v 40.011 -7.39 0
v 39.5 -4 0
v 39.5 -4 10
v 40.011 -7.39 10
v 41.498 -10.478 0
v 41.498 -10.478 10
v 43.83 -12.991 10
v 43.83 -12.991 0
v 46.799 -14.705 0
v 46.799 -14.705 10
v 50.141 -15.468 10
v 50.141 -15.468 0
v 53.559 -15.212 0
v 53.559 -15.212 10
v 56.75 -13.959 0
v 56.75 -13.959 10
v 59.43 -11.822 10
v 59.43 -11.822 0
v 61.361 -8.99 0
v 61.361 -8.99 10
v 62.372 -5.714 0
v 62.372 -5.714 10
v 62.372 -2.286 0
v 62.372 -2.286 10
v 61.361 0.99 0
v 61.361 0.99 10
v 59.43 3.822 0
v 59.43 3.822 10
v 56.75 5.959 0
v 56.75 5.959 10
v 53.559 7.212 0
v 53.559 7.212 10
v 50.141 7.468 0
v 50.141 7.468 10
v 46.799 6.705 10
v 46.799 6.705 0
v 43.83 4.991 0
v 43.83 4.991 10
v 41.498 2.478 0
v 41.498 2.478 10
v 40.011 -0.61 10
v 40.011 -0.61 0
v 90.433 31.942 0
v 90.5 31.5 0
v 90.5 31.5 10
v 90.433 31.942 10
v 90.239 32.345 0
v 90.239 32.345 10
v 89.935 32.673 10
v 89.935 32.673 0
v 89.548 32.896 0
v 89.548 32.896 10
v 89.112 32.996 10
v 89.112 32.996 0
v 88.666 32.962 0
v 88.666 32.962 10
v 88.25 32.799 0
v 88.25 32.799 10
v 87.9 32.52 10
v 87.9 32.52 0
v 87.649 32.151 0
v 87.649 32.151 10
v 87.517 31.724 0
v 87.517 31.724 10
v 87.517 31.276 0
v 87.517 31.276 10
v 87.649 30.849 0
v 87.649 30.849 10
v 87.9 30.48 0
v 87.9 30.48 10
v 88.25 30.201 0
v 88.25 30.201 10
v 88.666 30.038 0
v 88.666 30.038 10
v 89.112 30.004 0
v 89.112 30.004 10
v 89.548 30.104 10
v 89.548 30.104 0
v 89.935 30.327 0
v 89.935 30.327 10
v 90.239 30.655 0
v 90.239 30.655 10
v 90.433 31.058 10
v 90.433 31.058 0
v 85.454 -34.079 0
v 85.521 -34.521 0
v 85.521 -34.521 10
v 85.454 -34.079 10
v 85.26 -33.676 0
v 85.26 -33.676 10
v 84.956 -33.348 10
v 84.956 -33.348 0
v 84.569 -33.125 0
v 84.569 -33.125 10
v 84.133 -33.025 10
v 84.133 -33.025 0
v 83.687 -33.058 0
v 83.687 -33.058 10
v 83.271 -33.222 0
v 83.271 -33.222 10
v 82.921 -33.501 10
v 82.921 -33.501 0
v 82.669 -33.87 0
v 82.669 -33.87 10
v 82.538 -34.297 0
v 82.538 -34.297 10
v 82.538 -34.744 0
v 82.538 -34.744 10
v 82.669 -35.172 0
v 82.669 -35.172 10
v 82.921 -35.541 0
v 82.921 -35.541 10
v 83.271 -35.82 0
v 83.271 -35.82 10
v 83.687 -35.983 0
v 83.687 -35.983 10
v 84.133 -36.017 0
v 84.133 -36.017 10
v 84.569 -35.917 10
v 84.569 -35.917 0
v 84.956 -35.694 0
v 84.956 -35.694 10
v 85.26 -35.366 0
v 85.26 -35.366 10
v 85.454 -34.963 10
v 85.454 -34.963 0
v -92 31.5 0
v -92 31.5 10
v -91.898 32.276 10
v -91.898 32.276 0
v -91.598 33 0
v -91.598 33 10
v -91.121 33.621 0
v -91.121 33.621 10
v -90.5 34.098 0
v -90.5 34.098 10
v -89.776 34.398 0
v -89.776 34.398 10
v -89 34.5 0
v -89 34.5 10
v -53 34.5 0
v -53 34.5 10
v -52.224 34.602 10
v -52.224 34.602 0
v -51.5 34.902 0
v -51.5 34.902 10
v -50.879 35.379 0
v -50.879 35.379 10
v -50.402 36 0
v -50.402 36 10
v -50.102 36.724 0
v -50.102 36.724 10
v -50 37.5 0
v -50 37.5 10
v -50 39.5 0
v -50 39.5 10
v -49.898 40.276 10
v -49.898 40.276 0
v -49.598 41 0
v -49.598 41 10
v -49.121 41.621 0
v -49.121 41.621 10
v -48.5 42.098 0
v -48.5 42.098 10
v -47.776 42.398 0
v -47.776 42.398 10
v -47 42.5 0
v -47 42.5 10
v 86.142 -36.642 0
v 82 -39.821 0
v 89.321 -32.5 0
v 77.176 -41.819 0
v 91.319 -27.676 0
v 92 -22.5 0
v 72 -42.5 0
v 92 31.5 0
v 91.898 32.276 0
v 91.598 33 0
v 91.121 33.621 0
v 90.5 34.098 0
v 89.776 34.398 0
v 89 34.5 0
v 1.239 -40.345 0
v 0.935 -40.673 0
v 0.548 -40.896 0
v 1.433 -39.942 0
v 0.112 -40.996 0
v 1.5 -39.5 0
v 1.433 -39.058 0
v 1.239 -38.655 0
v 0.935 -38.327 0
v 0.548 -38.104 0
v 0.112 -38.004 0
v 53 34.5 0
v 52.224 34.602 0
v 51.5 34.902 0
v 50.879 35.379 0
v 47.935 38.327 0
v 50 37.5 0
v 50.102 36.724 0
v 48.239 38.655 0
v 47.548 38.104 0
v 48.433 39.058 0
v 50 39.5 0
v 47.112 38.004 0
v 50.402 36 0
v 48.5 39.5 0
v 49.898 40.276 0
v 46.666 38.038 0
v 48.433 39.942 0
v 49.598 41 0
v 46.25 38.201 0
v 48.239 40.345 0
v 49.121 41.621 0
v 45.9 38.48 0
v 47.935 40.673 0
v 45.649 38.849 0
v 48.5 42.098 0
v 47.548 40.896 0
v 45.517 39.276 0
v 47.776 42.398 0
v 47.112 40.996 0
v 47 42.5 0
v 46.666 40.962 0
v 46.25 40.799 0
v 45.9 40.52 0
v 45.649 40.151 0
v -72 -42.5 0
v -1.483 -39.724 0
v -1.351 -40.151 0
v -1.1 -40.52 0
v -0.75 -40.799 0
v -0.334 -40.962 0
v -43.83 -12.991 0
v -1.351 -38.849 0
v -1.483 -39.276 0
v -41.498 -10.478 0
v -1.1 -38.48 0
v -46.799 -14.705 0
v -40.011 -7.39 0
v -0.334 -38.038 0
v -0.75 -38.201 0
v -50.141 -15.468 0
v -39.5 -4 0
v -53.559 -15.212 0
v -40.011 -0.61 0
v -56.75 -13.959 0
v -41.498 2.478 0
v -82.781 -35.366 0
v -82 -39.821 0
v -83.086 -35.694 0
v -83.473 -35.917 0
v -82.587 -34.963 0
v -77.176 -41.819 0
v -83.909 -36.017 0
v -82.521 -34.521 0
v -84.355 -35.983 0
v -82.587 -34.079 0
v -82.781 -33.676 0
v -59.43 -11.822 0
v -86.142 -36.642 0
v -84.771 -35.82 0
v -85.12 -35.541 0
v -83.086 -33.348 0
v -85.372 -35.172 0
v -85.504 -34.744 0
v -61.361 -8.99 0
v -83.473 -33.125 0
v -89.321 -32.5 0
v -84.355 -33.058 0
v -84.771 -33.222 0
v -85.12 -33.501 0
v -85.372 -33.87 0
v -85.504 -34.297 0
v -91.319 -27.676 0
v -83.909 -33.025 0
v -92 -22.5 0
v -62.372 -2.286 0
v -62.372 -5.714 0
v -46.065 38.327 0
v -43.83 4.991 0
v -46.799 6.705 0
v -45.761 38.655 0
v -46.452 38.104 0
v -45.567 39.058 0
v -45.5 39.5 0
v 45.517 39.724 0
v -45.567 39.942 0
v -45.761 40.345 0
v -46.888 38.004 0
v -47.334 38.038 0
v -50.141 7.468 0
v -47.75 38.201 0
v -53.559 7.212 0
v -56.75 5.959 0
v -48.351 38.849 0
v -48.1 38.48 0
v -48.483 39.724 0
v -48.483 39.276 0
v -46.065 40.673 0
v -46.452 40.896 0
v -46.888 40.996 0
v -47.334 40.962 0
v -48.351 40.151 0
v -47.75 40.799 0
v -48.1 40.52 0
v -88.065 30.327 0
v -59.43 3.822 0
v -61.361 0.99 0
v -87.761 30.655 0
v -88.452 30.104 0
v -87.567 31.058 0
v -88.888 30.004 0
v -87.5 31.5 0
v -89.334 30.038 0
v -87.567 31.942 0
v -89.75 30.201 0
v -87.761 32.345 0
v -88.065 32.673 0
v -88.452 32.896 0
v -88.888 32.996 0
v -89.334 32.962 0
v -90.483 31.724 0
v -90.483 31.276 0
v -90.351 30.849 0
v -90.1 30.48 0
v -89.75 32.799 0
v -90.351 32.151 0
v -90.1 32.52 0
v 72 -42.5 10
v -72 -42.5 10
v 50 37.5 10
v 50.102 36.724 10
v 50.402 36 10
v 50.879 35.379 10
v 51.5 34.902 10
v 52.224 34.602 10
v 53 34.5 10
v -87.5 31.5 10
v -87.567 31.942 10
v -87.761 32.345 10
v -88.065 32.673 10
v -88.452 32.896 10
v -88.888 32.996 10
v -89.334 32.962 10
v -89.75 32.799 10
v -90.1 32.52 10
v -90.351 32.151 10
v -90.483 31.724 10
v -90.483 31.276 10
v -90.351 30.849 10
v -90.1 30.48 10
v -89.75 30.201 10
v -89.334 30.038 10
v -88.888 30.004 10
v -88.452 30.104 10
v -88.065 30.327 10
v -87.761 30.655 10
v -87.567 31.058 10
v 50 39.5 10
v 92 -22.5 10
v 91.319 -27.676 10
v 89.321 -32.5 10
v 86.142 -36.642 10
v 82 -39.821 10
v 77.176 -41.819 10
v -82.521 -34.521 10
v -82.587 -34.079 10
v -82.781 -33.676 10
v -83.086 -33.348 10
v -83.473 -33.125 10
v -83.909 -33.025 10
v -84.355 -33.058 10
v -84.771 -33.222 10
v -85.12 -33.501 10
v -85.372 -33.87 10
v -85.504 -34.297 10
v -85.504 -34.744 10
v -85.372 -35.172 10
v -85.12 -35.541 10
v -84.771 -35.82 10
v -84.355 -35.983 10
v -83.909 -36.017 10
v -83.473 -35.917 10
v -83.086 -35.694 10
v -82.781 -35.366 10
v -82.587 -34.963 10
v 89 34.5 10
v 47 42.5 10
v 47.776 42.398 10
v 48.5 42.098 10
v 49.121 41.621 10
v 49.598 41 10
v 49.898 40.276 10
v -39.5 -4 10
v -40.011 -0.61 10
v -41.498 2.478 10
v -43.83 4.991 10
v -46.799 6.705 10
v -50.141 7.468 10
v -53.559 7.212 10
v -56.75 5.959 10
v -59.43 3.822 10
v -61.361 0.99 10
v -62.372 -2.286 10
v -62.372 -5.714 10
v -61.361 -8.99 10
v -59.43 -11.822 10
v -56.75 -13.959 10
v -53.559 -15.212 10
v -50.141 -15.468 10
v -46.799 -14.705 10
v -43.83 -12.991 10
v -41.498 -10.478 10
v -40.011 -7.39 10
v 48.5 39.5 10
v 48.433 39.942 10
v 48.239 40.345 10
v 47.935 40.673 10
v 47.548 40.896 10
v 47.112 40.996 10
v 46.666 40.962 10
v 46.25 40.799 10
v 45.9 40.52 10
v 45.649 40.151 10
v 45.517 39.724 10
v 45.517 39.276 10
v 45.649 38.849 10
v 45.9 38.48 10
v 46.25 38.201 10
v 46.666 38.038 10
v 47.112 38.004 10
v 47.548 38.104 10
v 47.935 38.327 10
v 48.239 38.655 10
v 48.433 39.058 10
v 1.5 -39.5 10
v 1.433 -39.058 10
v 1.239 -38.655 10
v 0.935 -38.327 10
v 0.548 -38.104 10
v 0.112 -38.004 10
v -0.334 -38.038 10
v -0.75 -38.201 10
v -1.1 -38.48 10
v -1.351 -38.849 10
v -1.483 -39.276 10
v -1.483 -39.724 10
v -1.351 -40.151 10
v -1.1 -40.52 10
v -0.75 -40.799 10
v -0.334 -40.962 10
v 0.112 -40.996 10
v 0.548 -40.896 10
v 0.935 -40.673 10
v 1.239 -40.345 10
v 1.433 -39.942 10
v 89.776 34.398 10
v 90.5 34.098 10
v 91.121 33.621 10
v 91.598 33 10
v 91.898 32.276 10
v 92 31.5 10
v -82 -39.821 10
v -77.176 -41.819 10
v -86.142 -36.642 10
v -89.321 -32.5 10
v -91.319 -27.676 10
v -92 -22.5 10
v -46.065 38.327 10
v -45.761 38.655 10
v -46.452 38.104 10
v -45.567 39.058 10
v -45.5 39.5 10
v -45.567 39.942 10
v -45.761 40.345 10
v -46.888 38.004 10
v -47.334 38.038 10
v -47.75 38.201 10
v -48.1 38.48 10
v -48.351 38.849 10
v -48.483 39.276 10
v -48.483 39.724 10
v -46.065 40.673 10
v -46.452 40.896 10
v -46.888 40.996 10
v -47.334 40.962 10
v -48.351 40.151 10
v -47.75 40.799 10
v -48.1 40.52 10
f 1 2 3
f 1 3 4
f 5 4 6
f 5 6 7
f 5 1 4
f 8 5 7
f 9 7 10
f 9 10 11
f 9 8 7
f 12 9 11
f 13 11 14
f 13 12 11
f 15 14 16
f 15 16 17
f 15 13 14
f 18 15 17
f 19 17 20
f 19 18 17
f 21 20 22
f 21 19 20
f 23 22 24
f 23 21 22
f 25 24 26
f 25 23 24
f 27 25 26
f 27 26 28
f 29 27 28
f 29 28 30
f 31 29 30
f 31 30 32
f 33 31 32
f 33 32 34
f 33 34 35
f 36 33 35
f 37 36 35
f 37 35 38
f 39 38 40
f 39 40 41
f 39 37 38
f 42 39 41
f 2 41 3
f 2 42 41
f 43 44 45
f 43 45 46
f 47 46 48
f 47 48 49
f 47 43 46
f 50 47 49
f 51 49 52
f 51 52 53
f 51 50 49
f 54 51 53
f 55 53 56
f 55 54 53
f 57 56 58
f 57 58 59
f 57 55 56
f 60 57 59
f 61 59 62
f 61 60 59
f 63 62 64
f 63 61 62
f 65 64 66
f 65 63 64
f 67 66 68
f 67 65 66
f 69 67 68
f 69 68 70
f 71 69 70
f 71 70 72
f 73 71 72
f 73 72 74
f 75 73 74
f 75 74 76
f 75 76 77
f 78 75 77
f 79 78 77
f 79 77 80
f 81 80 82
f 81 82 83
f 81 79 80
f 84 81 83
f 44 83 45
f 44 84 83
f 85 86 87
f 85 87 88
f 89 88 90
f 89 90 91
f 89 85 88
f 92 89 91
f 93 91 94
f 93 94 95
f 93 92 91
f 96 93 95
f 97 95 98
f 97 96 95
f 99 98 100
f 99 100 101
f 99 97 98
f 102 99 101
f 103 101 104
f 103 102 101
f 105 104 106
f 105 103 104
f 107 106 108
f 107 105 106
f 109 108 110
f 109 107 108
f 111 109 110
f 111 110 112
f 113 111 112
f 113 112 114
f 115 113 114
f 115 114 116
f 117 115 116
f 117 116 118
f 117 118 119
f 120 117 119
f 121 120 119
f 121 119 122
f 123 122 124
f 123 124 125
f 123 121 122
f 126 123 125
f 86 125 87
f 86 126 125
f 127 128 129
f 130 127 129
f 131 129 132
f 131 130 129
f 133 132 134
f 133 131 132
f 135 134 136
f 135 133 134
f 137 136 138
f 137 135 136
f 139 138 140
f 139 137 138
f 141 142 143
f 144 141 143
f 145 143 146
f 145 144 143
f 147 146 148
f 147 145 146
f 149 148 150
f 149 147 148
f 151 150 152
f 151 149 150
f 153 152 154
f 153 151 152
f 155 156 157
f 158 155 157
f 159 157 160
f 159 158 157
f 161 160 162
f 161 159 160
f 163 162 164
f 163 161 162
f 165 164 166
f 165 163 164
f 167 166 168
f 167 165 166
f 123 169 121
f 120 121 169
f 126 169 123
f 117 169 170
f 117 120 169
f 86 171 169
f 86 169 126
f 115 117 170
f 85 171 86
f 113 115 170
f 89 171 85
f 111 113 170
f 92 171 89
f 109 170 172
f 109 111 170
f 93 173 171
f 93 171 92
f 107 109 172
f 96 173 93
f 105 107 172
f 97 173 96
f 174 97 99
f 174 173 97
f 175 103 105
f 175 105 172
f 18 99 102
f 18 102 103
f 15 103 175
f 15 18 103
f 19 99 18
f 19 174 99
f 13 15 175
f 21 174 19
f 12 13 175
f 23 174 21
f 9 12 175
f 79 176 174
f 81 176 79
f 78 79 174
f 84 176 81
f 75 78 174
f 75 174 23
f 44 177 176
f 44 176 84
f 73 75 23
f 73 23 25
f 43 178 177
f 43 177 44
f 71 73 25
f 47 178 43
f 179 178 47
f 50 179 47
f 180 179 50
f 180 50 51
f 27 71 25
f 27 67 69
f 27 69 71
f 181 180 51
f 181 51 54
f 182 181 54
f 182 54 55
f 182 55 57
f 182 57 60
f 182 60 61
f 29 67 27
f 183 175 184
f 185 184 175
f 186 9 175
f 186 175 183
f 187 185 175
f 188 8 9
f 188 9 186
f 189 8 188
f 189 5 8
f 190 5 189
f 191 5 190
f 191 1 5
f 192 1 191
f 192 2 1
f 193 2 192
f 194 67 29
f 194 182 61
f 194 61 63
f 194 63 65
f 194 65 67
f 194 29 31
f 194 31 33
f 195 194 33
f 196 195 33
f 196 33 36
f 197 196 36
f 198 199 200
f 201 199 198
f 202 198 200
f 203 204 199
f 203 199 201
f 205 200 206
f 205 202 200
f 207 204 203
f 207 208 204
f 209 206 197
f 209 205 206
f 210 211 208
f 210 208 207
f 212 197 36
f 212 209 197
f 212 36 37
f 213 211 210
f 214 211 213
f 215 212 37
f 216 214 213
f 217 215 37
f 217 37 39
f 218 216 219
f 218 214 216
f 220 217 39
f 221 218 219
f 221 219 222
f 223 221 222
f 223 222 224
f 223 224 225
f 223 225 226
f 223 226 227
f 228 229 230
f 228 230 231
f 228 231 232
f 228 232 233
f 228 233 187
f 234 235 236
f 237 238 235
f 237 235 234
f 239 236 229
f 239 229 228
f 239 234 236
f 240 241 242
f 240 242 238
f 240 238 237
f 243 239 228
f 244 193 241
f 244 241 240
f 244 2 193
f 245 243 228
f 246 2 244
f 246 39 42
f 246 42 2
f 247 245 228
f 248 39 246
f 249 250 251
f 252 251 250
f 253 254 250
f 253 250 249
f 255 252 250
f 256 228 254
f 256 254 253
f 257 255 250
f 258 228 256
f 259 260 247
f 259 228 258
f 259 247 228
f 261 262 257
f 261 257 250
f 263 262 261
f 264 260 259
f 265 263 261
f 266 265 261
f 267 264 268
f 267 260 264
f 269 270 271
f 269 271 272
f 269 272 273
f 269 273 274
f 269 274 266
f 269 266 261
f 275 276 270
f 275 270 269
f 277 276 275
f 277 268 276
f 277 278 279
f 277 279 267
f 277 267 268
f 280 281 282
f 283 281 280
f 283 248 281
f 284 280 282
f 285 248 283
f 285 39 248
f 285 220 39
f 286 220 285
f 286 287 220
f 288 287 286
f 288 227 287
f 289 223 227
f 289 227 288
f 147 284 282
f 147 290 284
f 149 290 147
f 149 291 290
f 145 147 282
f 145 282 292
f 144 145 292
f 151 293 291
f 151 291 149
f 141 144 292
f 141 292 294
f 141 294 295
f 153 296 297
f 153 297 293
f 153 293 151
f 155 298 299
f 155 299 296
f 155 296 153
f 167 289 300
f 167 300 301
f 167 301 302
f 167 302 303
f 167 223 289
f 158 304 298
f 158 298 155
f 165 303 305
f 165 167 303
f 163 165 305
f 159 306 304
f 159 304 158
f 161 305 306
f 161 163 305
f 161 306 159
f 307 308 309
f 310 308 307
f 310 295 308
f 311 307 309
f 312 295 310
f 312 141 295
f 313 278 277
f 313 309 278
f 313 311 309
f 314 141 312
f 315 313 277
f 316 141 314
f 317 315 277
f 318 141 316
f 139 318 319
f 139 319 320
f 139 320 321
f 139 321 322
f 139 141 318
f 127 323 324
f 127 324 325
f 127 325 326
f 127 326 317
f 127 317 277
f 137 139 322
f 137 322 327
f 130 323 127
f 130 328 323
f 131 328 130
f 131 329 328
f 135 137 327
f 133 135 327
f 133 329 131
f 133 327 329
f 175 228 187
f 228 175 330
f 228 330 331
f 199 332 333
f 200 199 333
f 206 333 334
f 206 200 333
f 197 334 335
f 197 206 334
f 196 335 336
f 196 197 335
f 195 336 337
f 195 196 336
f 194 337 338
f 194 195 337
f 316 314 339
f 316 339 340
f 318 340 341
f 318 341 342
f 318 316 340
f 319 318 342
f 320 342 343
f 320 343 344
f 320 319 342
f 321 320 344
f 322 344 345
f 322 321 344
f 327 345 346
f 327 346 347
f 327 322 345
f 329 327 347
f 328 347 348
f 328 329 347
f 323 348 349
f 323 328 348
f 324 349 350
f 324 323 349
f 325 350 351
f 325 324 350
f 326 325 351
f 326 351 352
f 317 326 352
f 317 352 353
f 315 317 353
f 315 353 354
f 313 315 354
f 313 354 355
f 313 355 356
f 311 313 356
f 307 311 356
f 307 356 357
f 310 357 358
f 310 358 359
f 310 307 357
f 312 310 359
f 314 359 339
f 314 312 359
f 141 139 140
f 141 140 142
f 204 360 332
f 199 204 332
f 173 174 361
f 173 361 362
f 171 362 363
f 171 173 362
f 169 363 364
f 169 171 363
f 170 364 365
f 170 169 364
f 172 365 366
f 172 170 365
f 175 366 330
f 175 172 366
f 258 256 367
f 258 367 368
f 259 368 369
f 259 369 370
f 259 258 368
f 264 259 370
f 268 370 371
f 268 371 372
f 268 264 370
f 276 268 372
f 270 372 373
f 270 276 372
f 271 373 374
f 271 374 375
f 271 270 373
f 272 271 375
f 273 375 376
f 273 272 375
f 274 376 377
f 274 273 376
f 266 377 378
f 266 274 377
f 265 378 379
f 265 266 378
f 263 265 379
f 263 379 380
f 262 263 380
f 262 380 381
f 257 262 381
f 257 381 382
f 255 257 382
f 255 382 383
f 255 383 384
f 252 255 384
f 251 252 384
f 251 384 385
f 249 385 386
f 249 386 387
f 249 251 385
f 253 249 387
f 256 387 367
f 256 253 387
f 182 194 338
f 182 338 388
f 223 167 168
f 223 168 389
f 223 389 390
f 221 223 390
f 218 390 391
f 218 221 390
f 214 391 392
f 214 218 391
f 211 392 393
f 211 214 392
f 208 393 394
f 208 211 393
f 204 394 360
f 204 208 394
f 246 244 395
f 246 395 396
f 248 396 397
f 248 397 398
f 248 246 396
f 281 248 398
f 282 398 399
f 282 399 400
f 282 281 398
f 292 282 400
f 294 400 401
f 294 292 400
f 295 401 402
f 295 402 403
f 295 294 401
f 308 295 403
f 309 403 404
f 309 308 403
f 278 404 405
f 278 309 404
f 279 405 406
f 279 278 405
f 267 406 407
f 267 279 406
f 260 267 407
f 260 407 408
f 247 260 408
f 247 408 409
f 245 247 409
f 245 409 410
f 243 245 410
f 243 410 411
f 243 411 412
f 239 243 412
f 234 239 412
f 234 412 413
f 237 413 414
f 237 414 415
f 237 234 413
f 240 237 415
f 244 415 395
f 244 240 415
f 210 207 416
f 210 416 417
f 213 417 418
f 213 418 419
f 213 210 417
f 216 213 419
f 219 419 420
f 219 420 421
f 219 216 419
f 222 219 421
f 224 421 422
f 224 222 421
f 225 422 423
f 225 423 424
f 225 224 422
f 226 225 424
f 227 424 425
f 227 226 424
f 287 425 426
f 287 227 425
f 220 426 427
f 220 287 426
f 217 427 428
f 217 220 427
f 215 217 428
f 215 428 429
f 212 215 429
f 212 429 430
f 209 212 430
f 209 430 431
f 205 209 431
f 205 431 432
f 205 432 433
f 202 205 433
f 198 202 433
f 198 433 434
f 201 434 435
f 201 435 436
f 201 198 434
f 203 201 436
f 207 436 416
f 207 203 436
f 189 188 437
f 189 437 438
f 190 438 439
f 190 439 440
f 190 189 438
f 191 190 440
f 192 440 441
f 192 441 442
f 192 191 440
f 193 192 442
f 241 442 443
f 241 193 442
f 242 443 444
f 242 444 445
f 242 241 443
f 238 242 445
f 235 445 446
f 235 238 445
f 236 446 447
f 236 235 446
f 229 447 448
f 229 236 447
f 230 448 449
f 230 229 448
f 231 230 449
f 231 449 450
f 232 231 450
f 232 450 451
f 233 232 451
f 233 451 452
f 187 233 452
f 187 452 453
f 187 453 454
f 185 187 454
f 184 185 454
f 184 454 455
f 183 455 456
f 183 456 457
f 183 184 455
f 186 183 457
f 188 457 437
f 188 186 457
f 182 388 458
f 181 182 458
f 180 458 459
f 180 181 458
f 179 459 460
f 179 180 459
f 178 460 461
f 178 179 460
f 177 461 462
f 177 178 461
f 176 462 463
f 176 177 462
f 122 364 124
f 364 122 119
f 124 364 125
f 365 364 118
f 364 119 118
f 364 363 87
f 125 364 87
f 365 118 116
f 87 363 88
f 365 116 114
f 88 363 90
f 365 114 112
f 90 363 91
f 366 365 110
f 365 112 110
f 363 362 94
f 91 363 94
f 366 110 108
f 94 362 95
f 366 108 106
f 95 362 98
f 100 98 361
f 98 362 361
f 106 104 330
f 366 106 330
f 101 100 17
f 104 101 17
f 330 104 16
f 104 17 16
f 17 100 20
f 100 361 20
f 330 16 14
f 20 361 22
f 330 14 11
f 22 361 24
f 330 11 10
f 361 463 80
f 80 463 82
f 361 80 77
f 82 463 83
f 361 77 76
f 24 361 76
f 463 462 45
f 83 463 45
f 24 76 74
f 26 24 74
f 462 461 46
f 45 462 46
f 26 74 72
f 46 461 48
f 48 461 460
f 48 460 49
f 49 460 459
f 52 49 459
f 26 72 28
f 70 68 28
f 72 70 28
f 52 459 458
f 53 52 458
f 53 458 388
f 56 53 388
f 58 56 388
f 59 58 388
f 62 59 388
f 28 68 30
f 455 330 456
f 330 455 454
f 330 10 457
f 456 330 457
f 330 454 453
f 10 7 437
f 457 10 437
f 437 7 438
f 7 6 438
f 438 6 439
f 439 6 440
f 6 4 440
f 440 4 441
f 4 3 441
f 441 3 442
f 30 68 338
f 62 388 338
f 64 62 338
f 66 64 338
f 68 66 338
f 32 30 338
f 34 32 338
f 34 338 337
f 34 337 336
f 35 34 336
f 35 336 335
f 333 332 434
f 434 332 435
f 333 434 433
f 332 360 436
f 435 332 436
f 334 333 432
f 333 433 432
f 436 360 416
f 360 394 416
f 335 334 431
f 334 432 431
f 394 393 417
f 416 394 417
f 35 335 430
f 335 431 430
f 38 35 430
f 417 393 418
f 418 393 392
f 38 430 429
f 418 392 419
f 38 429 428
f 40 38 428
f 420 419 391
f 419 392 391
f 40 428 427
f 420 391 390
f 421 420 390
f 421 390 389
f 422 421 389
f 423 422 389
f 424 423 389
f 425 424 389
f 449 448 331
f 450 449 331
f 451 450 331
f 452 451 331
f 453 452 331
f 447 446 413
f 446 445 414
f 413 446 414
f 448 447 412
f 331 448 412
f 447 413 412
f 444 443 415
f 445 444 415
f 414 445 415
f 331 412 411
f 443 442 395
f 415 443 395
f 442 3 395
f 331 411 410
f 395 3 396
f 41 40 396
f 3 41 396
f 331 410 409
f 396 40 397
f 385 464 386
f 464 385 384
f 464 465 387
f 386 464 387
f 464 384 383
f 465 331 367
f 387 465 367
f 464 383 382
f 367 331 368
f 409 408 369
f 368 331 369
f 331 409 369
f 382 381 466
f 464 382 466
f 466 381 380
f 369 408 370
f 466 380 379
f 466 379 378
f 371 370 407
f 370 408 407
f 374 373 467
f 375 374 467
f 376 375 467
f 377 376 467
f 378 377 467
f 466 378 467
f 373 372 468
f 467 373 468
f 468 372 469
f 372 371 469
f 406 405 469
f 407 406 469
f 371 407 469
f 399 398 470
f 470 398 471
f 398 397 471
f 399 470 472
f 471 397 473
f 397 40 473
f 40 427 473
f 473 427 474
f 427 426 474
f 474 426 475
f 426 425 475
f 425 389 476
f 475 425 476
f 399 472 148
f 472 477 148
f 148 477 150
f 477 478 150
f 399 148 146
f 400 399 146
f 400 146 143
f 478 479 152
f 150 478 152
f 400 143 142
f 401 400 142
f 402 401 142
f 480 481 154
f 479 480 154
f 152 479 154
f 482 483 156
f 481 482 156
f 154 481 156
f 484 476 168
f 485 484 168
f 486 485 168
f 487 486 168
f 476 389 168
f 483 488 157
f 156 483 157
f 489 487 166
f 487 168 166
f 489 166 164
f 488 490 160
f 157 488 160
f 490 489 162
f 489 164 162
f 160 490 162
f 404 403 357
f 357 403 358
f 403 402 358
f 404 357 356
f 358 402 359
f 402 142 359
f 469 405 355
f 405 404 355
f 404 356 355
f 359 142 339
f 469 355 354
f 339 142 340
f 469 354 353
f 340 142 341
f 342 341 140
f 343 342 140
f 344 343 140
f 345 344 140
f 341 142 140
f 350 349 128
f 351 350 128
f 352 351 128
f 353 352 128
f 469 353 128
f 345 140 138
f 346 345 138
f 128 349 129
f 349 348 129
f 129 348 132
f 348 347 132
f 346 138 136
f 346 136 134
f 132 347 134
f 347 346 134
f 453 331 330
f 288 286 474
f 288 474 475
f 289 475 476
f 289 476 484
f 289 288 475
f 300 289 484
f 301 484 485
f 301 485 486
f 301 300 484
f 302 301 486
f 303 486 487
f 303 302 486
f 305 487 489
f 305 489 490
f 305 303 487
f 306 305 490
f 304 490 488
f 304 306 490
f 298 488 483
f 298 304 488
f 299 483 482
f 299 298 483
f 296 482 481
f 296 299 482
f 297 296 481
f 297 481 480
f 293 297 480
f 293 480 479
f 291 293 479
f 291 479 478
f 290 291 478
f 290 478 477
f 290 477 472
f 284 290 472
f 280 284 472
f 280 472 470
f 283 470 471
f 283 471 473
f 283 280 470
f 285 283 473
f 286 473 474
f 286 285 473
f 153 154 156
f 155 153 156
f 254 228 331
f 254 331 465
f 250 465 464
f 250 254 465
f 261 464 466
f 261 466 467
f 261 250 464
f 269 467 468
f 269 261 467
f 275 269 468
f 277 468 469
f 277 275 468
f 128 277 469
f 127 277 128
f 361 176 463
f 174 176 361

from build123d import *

# Parameters (mm, degrees)
SKETCH1_R           = 11.5
SKETCH1_R_2         = 1.5
BOSS_EXTRUDE1_DEPTH = 10


with BuildPart() as part:
    # Sketch1 → Boss-Extrude1 (new body)
    with BuildSketch(Plane.XY):
        with BuildLine():
            Line((50, 39.5), (50, 37.5))
            ThreePointArc((50, 37.5), (50.878679656, 35.378679656), (53, 34.5))
            Line((53, 34.5), (89, 34.5))
            ThreePointArc((89, 34.5), (91.121320344, 33.621320344), (92, 31.5))
            Line((92, 31.5), (92, -22.5))
            ThreePointArc((92, -22.5), (86.142135624, -36.642135624), (72, -42.5))
            Line((72, -42.5), (-72, -42.5))
            ThreePointArc((-72, -42.5), (-86.142135624, -36.642135624), (-92, -22.5))
            Line((-92, -22.5), (-92, 31.5))
            ThreePointArc((-92, 31.5), (-91.121320344, 33.621320344), (-89, 34.5))
            Line((-89, 34.5), (-53, 34.5))
            ThreePointArc((-53, 34.5), (-50.878679656, 35.378679656), (-50, 37.5))
            Line((-50, 37.5), (-50, 39.5))
            ThreePointArc((-50, 39.5), (-49.121320344, 41.621320344), (-47, 42.5))
            Line((-47, 42.5), (47, 42.5))
            ThreePointArc((47, 42.5), (49.121320344, 41.621320344), (50, 39.5))
        make_face()
        with Locations(Location((51, -4, 0), (0, 0, 180))):
            Circle(SKETCH1_R, mode=Mode.SUBTRACT)
        with Locations((0, -39.5)):
            Circle(SKETCH1_R_2, mode=Mode.SUBTRACT)
        with Locations((84.02081528, -34.52081528)):
            Circle(SKETCH1_R_2, mode=Mode.SUBTRACT)
        with Locations((89, 31.5)):
            Circle(SKETCH1_R_2, mode=Mode.SUBTRACT)
        with Locations((47, 39.5)):
            Circle(SKETCH1_R_2, mode=Mode.SUBTRACT)
        with Locations((-47, 39.5)):
            Circle(SKETCH1_R_2, mode=Mode.SUBTRACT)
        with Locations((-89, 31.5)):
            Circle(SKETCH1_R_2, mode=Mode.SUBTRACT)
        with Locations((-84.02081528, -34.52081528)):
            Circle(SKETCH1_R_2, mode=Mode.SUBTRACT)
        with Locations((-51, -4)):
            Circle(SKETCH1_R, mode=Mode.SUBTRACT)
    extrude(amount=BOSS_EXTRUDE1_DEPTH)


solid = part.part
